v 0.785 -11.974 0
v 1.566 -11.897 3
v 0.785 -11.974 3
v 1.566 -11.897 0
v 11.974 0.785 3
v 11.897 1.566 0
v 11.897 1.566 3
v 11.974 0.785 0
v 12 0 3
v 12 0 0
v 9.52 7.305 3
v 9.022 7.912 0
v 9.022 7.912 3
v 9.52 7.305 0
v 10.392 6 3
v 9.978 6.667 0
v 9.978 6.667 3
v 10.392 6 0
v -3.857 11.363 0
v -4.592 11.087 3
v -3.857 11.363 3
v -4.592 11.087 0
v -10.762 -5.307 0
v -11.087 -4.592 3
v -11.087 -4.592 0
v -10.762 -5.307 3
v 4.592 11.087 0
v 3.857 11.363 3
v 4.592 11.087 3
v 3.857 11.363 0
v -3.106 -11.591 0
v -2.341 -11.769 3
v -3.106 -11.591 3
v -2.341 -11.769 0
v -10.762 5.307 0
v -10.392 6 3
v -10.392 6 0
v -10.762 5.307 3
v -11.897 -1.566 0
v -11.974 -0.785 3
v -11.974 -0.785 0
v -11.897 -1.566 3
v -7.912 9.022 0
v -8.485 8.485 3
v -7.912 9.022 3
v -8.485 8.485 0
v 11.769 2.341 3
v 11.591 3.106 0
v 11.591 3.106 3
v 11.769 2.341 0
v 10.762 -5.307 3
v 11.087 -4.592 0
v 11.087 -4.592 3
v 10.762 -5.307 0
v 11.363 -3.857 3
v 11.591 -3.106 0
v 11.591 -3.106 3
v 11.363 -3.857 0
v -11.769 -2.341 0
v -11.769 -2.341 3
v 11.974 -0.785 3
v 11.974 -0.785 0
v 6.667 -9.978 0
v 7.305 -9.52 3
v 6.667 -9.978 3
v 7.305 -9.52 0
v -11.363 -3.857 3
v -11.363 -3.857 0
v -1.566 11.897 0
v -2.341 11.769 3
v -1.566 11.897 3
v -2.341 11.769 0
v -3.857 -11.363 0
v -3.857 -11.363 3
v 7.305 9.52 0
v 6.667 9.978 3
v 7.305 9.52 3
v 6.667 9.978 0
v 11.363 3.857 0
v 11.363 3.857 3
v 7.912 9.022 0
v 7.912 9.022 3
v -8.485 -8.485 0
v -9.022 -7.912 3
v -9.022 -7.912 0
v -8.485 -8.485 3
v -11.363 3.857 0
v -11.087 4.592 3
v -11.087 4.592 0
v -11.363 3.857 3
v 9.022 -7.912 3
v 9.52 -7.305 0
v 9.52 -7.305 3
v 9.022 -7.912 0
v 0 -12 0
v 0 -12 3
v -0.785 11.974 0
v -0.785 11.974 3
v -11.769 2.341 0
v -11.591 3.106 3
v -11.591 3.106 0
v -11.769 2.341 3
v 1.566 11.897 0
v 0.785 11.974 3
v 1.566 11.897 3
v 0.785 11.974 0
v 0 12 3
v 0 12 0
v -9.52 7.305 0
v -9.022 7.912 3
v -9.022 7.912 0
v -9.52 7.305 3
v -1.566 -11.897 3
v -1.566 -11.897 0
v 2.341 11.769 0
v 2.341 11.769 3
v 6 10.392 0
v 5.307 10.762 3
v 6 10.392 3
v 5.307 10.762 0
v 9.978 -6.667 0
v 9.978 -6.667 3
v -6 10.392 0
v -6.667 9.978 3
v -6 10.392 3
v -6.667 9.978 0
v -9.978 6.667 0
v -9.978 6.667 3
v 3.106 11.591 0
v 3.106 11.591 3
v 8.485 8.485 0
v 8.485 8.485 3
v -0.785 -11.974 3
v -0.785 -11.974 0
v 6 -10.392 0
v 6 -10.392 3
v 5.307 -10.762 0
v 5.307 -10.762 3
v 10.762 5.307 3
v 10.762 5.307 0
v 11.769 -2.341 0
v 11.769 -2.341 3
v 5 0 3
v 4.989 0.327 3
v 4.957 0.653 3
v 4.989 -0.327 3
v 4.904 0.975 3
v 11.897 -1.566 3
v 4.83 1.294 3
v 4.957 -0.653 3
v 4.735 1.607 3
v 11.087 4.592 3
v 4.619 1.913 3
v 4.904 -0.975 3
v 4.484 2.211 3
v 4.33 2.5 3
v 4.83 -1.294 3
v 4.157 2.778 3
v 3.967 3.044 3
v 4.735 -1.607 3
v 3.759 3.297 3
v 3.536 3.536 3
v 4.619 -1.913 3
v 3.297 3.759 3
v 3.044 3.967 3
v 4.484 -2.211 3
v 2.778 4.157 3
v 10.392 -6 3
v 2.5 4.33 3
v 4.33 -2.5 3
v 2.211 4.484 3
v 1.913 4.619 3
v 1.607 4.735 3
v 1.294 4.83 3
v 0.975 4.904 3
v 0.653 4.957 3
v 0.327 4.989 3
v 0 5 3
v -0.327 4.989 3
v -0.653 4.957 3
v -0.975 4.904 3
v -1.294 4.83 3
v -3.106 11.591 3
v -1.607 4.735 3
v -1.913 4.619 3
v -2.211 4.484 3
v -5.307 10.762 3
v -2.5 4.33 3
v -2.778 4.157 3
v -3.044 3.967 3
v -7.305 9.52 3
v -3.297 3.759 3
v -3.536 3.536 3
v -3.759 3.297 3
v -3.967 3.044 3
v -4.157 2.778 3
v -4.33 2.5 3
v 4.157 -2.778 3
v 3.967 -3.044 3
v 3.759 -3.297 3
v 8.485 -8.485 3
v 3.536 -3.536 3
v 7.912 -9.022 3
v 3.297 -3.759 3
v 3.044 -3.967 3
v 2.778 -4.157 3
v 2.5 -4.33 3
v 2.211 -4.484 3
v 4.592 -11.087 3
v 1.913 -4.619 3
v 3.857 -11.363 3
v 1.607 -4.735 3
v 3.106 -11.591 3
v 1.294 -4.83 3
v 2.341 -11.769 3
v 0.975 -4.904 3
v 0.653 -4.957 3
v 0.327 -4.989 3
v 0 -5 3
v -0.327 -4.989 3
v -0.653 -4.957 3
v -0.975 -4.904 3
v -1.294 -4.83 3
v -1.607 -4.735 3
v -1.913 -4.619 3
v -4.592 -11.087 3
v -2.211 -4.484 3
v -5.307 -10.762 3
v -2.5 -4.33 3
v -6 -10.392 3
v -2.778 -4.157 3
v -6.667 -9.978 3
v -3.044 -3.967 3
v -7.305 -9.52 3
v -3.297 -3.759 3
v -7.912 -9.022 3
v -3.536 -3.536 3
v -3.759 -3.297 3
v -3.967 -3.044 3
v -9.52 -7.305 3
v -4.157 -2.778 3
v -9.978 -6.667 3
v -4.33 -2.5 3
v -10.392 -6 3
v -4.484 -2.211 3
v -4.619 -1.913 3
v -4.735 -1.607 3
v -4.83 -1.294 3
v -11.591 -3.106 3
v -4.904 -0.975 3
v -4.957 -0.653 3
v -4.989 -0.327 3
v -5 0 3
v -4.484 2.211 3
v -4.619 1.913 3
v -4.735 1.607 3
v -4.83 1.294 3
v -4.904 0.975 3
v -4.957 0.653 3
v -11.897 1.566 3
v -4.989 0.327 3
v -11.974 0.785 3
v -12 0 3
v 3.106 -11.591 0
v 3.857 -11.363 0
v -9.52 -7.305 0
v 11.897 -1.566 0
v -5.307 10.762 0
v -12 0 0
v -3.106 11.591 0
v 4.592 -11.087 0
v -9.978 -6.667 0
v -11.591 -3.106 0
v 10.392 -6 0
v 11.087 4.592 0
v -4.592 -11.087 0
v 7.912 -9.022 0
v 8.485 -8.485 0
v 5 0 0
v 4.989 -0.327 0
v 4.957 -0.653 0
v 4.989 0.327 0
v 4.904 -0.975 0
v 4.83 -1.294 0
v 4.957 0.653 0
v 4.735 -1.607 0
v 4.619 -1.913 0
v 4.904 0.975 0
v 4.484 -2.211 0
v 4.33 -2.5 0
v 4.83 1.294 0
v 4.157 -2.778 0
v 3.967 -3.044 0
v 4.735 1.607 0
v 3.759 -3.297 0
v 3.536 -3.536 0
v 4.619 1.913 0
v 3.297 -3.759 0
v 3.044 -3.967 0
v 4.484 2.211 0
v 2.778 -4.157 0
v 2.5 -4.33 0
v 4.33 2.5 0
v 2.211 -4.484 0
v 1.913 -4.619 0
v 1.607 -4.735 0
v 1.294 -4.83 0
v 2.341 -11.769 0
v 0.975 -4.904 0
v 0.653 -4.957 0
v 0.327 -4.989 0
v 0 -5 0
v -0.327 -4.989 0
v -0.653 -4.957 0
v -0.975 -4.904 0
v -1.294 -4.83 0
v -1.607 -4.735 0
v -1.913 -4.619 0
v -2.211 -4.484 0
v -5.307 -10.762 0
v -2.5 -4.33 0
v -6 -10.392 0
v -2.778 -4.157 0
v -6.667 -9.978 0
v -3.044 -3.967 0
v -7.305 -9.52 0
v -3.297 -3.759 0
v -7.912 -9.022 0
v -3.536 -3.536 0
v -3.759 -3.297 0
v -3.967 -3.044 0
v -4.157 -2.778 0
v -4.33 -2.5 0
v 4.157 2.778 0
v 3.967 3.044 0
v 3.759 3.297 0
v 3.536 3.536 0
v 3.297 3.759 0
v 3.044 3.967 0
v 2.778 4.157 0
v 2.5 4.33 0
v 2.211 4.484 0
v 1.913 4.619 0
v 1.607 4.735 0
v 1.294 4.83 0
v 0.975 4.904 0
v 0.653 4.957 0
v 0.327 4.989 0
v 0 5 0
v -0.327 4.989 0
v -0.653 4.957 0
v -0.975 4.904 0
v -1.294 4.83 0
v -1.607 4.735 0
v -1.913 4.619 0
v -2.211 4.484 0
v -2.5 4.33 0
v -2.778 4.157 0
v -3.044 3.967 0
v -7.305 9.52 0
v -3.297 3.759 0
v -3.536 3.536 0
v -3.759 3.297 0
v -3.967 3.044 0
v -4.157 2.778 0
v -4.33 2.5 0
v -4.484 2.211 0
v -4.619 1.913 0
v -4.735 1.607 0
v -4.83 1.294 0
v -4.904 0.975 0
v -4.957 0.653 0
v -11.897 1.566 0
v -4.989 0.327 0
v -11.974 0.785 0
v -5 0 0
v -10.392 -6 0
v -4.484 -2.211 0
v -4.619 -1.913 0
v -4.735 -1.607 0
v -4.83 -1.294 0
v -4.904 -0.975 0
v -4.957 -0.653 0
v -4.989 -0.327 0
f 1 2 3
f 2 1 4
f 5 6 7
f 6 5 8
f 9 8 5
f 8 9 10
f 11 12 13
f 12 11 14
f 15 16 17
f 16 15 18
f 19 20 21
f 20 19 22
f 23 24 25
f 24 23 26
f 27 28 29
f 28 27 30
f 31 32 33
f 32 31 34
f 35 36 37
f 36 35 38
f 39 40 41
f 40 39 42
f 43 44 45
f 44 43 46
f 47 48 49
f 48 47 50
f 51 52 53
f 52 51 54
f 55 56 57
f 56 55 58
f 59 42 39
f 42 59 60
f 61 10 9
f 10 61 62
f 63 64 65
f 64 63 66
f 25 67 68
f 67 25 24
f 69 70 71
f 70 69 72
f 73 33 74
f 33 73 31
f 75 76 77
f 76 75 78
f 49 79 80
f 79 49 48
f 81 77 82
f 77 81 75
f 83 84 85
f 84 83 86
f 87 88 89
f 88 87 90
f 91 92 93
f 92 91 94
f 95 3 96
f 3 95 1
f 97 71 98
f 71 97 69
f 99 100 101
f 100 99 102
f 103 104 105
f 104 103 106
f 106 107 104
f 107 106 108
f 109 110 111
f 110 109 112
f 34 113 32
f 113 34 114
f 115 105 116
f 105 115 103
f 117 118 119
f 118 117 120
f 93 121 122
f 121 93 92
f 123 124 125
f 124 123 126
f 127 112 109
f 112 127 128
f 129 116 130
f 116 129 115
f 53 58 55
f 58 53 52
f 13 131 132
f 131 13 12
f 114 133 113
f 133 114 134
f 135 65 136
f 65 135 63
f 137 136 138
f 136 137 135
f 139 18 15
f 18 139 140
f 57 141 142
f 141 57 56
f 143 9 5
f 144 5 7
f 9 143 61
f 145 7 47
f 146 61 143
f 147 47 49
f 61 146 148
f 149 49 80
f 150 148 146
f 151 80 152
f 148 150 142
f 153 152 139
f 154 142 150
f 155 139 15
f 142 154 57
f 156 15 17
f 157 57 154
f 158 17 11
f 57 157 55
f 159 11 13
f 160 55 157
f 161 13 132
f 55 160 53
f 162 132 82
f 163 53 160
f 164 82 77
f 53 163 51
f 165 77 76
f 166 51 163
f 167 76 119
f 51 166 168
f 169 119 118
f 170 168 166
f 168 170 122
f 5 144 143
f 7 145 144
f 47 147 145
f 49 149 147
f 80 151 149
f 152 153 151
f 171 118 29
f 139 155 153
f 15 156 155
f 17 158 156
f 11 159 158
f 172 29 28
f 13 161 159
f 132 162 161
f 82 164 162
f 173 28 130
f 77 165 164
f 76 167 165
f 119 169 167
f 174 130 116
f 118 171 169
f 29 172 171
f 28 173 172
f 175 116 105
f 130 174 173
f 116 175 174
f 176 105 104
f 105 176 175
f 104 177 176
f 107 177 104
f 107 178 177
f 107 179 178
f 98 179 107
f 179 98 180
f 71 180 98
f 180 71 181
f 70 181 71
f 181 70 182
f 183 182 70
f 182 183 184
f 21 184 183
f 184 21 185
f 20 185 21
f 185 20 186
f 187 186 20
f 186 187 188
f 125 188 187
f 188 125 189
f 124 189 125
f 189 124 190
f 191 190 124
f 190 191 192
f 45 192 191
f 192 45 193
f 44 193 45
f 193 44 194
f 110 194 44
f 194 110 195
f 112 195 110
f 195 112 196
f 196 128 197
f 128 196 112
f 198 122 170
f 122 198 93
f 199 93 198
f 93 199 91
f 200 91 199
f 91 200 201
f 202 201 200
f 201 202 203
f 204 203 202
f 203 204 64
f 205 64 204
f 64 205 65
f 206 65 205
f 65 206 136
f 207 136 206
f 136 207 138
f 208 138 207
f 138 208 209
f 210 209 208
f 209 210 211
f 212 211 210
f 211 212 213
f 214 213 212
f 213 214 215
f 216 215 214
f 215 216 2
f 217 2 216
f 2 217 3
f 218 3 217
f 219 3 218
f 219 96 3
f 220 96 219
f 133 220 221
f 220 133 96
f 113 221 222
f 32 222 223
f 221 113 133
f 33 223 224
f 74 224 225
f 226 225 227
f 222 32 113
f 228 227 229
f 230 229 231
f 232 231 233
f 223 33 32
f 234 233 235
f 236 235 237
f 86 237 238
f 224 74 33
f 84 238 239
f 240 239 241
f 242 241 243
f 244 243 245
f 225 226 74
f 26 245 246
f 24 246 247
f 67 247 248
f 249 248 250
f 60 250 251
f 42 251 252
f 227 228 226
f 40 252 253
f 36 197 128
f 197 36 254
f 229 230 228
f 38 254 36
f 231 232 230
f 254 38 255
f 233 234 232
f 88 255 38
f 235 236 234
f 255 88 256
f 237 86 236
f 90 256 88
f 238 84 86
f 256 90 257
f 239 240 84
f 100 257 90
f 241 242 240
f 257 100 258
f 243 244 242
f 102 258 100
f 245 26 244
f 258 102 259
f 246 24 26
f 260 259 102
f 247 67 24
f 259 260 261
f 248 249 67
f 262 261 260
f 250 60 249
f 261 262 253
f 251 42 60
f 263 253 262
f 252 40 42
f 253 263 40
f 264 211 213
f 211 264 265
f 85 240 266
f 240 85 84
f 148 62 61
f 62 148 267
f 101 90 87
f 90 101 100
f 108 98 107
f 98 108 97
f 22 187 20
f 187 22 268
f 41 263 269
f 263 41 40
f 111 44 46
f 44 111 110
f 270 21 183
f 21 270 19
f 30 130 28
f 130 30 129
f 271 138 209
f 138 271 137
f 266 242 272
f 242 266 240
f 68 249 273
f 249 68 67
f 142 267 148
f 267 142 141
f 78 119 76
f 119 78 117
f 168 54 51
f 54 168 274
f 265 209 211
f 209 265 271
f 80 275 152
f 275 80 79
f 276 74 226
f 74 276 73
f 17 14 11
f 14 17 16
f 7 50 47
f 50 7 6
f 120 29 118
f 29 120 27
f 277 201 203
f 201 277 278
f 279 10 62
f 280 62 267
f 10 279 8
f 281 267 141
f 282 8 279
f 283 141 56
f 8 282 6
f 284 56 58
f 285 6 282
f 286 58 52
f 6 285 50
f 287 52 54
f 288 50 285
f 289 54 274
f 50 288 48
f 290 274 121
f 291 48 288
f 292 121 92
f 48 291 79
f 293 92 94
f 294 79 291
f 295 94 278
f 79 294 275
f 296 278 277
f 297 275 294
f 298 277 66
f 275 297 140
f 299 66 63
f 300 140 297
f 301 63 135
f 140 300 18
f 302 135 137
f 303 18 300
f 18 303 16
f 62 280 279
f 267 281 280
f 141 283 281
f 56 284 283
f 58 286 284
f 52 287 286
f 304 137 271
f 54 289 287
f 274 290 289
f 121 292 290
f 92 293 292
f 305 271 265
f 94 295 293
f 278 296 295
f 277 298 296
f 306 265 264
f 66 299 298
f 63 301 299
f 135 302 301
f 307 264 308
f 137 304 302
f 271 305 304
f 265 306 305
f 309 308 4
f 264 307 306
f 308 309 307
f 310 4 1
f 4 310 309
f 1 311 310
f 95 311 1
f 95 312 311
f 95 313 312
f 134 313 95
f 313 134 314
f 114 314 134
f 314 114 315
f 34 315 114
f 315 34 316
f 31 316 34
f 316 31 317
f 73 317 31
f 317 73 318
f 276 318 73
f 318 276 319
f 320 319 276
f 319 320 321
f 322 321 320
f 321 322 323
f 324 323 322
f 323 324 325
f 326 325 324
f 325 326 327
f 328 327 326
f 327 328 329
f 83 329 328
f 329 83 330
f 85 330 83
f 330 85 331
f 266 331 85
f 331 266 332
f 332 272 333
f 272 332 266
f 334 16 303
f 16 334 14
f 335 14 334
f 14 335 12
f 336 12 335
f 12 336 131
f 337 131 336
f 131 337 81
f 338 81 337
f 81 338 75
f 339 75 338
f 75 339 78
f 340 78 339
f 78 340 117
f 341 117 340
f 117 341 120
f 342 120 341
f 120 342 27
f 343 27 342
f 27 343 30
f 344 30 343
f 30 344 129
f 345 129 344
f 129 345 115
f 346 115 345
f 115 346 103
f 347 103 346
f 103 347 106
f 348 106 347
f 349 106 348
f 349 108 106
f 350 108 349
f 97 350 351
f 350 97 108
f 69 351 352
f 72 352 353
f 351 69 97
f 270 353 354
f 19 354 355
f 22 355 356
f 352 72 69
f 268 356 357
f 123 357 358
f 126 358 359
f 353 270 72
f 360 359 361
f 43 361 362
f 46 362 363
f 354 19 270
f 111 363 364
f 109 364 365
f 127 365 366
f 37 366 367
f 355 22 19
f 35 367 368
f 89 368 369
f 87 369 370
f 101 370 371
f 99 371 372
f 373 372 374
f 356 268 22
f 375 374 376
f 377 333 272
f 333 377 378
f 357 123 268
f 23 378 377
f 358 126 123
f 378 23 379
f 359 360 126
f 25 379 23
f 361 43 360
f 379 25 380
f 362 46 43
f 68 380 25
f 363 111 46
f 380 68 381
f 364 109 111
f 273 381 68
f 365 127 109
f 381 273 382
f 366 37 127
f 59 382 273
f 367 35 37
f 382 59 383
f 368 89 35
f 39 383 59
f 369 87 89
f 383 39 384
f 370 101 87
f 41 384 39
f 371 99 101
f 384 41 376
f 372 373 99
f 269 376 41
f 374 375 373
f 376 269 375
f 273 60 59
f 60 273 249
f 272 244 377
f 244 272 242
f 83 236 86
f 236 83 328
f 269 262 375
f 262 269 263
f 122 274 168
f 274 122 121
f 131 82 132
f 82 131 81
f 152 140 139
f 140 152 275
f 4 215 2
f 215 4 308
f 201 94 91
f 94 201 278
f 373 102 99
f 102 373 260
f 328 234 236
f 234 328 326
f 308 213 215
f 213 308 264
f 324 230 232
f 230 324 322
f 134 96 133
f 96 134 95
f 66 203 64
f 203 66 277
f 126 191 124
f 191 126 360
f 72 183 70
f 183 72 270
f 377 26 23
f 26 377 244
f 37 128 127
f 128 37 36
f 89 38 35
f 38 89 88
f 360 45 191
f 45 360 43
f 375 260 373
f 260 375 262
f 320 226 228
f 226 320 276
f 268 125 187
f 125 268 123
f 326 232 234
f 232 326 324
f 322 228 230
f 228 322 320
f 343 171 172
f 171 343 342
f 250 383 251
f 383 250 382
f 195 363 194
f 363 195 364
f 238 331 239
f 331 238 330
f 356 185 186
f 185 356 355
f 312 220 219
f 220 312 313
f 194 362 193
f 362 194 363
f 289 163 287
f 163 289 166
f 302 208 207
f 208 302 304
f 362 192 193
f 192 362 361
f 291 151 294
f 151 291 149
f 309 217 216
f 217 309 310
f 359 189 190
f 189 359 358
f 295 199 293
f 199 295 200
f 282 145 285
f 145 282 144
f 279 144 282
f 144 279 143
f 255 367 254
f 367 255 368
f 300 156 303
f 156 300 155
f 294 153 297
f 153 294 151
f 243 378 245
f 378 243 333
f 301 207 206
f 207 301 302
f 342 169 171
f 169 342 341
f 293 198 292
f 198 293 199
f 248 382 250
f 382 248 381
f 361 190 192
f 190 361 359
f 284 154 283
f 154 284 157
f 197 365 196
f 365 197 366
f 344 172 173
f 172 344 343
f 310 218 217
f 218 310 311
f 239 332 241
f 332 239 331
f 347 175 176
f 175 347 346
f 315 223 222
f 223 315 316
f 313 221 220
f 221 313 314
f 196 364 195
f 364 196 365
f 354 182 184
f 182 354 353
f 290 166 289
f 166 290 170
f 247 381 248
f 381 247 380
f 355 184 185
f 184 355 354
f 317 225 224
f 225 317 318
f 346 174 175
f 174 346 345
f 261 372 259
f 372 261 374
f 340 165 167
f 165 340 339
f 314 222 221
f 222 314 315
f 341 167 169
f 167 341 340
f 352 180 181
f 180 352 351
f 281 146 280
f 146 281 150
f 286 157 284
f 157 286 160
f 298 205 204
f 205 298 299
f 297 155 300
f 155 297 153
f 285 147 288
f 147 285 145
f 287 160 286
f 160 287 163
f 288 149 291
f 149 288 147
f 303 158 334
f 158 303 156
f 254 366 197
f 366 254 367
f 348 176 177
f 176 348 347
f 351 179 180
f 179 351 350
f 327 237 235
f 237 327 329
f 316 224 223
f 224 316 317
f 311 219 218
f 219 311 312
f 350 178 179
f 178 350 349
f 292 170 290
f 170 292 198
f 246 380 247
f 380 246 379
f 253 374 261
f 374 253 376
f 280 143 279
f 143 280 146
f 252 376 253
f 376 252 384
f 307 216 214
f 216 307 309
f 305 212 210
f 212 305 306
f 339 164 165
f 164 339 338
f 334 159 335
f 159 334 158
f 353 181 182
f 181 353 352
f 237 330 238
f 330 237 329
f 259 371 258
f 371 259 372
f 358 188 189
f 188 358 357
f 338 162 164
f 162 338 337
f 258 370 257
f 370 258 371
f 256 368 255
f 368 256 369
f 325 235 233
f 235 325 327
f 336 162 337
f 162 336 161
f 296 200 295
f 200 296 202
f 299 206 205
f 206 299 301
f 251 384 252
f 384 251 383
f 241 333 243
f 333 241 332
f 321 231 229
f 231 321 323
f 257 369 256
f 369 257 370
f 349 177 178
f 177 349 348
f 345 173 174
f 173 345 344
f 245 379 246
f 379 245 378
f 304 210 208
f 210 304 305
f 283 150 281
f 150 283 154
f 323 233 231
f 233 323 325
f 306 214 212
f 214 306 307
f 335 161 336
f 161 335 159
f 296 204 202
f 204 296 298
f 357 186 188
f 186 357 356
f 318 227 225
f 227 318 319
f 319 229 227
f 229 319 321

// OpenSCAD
outer_diameter = 24; inner_diameter = 10; thickness = 3;
$fn = 96;
difference() {
  cylinder(d = outer_diameter, h = thickness);
  translate([0, 0, -1]) cylinder(d = inner_diameter, h = thickness + 2);
}
